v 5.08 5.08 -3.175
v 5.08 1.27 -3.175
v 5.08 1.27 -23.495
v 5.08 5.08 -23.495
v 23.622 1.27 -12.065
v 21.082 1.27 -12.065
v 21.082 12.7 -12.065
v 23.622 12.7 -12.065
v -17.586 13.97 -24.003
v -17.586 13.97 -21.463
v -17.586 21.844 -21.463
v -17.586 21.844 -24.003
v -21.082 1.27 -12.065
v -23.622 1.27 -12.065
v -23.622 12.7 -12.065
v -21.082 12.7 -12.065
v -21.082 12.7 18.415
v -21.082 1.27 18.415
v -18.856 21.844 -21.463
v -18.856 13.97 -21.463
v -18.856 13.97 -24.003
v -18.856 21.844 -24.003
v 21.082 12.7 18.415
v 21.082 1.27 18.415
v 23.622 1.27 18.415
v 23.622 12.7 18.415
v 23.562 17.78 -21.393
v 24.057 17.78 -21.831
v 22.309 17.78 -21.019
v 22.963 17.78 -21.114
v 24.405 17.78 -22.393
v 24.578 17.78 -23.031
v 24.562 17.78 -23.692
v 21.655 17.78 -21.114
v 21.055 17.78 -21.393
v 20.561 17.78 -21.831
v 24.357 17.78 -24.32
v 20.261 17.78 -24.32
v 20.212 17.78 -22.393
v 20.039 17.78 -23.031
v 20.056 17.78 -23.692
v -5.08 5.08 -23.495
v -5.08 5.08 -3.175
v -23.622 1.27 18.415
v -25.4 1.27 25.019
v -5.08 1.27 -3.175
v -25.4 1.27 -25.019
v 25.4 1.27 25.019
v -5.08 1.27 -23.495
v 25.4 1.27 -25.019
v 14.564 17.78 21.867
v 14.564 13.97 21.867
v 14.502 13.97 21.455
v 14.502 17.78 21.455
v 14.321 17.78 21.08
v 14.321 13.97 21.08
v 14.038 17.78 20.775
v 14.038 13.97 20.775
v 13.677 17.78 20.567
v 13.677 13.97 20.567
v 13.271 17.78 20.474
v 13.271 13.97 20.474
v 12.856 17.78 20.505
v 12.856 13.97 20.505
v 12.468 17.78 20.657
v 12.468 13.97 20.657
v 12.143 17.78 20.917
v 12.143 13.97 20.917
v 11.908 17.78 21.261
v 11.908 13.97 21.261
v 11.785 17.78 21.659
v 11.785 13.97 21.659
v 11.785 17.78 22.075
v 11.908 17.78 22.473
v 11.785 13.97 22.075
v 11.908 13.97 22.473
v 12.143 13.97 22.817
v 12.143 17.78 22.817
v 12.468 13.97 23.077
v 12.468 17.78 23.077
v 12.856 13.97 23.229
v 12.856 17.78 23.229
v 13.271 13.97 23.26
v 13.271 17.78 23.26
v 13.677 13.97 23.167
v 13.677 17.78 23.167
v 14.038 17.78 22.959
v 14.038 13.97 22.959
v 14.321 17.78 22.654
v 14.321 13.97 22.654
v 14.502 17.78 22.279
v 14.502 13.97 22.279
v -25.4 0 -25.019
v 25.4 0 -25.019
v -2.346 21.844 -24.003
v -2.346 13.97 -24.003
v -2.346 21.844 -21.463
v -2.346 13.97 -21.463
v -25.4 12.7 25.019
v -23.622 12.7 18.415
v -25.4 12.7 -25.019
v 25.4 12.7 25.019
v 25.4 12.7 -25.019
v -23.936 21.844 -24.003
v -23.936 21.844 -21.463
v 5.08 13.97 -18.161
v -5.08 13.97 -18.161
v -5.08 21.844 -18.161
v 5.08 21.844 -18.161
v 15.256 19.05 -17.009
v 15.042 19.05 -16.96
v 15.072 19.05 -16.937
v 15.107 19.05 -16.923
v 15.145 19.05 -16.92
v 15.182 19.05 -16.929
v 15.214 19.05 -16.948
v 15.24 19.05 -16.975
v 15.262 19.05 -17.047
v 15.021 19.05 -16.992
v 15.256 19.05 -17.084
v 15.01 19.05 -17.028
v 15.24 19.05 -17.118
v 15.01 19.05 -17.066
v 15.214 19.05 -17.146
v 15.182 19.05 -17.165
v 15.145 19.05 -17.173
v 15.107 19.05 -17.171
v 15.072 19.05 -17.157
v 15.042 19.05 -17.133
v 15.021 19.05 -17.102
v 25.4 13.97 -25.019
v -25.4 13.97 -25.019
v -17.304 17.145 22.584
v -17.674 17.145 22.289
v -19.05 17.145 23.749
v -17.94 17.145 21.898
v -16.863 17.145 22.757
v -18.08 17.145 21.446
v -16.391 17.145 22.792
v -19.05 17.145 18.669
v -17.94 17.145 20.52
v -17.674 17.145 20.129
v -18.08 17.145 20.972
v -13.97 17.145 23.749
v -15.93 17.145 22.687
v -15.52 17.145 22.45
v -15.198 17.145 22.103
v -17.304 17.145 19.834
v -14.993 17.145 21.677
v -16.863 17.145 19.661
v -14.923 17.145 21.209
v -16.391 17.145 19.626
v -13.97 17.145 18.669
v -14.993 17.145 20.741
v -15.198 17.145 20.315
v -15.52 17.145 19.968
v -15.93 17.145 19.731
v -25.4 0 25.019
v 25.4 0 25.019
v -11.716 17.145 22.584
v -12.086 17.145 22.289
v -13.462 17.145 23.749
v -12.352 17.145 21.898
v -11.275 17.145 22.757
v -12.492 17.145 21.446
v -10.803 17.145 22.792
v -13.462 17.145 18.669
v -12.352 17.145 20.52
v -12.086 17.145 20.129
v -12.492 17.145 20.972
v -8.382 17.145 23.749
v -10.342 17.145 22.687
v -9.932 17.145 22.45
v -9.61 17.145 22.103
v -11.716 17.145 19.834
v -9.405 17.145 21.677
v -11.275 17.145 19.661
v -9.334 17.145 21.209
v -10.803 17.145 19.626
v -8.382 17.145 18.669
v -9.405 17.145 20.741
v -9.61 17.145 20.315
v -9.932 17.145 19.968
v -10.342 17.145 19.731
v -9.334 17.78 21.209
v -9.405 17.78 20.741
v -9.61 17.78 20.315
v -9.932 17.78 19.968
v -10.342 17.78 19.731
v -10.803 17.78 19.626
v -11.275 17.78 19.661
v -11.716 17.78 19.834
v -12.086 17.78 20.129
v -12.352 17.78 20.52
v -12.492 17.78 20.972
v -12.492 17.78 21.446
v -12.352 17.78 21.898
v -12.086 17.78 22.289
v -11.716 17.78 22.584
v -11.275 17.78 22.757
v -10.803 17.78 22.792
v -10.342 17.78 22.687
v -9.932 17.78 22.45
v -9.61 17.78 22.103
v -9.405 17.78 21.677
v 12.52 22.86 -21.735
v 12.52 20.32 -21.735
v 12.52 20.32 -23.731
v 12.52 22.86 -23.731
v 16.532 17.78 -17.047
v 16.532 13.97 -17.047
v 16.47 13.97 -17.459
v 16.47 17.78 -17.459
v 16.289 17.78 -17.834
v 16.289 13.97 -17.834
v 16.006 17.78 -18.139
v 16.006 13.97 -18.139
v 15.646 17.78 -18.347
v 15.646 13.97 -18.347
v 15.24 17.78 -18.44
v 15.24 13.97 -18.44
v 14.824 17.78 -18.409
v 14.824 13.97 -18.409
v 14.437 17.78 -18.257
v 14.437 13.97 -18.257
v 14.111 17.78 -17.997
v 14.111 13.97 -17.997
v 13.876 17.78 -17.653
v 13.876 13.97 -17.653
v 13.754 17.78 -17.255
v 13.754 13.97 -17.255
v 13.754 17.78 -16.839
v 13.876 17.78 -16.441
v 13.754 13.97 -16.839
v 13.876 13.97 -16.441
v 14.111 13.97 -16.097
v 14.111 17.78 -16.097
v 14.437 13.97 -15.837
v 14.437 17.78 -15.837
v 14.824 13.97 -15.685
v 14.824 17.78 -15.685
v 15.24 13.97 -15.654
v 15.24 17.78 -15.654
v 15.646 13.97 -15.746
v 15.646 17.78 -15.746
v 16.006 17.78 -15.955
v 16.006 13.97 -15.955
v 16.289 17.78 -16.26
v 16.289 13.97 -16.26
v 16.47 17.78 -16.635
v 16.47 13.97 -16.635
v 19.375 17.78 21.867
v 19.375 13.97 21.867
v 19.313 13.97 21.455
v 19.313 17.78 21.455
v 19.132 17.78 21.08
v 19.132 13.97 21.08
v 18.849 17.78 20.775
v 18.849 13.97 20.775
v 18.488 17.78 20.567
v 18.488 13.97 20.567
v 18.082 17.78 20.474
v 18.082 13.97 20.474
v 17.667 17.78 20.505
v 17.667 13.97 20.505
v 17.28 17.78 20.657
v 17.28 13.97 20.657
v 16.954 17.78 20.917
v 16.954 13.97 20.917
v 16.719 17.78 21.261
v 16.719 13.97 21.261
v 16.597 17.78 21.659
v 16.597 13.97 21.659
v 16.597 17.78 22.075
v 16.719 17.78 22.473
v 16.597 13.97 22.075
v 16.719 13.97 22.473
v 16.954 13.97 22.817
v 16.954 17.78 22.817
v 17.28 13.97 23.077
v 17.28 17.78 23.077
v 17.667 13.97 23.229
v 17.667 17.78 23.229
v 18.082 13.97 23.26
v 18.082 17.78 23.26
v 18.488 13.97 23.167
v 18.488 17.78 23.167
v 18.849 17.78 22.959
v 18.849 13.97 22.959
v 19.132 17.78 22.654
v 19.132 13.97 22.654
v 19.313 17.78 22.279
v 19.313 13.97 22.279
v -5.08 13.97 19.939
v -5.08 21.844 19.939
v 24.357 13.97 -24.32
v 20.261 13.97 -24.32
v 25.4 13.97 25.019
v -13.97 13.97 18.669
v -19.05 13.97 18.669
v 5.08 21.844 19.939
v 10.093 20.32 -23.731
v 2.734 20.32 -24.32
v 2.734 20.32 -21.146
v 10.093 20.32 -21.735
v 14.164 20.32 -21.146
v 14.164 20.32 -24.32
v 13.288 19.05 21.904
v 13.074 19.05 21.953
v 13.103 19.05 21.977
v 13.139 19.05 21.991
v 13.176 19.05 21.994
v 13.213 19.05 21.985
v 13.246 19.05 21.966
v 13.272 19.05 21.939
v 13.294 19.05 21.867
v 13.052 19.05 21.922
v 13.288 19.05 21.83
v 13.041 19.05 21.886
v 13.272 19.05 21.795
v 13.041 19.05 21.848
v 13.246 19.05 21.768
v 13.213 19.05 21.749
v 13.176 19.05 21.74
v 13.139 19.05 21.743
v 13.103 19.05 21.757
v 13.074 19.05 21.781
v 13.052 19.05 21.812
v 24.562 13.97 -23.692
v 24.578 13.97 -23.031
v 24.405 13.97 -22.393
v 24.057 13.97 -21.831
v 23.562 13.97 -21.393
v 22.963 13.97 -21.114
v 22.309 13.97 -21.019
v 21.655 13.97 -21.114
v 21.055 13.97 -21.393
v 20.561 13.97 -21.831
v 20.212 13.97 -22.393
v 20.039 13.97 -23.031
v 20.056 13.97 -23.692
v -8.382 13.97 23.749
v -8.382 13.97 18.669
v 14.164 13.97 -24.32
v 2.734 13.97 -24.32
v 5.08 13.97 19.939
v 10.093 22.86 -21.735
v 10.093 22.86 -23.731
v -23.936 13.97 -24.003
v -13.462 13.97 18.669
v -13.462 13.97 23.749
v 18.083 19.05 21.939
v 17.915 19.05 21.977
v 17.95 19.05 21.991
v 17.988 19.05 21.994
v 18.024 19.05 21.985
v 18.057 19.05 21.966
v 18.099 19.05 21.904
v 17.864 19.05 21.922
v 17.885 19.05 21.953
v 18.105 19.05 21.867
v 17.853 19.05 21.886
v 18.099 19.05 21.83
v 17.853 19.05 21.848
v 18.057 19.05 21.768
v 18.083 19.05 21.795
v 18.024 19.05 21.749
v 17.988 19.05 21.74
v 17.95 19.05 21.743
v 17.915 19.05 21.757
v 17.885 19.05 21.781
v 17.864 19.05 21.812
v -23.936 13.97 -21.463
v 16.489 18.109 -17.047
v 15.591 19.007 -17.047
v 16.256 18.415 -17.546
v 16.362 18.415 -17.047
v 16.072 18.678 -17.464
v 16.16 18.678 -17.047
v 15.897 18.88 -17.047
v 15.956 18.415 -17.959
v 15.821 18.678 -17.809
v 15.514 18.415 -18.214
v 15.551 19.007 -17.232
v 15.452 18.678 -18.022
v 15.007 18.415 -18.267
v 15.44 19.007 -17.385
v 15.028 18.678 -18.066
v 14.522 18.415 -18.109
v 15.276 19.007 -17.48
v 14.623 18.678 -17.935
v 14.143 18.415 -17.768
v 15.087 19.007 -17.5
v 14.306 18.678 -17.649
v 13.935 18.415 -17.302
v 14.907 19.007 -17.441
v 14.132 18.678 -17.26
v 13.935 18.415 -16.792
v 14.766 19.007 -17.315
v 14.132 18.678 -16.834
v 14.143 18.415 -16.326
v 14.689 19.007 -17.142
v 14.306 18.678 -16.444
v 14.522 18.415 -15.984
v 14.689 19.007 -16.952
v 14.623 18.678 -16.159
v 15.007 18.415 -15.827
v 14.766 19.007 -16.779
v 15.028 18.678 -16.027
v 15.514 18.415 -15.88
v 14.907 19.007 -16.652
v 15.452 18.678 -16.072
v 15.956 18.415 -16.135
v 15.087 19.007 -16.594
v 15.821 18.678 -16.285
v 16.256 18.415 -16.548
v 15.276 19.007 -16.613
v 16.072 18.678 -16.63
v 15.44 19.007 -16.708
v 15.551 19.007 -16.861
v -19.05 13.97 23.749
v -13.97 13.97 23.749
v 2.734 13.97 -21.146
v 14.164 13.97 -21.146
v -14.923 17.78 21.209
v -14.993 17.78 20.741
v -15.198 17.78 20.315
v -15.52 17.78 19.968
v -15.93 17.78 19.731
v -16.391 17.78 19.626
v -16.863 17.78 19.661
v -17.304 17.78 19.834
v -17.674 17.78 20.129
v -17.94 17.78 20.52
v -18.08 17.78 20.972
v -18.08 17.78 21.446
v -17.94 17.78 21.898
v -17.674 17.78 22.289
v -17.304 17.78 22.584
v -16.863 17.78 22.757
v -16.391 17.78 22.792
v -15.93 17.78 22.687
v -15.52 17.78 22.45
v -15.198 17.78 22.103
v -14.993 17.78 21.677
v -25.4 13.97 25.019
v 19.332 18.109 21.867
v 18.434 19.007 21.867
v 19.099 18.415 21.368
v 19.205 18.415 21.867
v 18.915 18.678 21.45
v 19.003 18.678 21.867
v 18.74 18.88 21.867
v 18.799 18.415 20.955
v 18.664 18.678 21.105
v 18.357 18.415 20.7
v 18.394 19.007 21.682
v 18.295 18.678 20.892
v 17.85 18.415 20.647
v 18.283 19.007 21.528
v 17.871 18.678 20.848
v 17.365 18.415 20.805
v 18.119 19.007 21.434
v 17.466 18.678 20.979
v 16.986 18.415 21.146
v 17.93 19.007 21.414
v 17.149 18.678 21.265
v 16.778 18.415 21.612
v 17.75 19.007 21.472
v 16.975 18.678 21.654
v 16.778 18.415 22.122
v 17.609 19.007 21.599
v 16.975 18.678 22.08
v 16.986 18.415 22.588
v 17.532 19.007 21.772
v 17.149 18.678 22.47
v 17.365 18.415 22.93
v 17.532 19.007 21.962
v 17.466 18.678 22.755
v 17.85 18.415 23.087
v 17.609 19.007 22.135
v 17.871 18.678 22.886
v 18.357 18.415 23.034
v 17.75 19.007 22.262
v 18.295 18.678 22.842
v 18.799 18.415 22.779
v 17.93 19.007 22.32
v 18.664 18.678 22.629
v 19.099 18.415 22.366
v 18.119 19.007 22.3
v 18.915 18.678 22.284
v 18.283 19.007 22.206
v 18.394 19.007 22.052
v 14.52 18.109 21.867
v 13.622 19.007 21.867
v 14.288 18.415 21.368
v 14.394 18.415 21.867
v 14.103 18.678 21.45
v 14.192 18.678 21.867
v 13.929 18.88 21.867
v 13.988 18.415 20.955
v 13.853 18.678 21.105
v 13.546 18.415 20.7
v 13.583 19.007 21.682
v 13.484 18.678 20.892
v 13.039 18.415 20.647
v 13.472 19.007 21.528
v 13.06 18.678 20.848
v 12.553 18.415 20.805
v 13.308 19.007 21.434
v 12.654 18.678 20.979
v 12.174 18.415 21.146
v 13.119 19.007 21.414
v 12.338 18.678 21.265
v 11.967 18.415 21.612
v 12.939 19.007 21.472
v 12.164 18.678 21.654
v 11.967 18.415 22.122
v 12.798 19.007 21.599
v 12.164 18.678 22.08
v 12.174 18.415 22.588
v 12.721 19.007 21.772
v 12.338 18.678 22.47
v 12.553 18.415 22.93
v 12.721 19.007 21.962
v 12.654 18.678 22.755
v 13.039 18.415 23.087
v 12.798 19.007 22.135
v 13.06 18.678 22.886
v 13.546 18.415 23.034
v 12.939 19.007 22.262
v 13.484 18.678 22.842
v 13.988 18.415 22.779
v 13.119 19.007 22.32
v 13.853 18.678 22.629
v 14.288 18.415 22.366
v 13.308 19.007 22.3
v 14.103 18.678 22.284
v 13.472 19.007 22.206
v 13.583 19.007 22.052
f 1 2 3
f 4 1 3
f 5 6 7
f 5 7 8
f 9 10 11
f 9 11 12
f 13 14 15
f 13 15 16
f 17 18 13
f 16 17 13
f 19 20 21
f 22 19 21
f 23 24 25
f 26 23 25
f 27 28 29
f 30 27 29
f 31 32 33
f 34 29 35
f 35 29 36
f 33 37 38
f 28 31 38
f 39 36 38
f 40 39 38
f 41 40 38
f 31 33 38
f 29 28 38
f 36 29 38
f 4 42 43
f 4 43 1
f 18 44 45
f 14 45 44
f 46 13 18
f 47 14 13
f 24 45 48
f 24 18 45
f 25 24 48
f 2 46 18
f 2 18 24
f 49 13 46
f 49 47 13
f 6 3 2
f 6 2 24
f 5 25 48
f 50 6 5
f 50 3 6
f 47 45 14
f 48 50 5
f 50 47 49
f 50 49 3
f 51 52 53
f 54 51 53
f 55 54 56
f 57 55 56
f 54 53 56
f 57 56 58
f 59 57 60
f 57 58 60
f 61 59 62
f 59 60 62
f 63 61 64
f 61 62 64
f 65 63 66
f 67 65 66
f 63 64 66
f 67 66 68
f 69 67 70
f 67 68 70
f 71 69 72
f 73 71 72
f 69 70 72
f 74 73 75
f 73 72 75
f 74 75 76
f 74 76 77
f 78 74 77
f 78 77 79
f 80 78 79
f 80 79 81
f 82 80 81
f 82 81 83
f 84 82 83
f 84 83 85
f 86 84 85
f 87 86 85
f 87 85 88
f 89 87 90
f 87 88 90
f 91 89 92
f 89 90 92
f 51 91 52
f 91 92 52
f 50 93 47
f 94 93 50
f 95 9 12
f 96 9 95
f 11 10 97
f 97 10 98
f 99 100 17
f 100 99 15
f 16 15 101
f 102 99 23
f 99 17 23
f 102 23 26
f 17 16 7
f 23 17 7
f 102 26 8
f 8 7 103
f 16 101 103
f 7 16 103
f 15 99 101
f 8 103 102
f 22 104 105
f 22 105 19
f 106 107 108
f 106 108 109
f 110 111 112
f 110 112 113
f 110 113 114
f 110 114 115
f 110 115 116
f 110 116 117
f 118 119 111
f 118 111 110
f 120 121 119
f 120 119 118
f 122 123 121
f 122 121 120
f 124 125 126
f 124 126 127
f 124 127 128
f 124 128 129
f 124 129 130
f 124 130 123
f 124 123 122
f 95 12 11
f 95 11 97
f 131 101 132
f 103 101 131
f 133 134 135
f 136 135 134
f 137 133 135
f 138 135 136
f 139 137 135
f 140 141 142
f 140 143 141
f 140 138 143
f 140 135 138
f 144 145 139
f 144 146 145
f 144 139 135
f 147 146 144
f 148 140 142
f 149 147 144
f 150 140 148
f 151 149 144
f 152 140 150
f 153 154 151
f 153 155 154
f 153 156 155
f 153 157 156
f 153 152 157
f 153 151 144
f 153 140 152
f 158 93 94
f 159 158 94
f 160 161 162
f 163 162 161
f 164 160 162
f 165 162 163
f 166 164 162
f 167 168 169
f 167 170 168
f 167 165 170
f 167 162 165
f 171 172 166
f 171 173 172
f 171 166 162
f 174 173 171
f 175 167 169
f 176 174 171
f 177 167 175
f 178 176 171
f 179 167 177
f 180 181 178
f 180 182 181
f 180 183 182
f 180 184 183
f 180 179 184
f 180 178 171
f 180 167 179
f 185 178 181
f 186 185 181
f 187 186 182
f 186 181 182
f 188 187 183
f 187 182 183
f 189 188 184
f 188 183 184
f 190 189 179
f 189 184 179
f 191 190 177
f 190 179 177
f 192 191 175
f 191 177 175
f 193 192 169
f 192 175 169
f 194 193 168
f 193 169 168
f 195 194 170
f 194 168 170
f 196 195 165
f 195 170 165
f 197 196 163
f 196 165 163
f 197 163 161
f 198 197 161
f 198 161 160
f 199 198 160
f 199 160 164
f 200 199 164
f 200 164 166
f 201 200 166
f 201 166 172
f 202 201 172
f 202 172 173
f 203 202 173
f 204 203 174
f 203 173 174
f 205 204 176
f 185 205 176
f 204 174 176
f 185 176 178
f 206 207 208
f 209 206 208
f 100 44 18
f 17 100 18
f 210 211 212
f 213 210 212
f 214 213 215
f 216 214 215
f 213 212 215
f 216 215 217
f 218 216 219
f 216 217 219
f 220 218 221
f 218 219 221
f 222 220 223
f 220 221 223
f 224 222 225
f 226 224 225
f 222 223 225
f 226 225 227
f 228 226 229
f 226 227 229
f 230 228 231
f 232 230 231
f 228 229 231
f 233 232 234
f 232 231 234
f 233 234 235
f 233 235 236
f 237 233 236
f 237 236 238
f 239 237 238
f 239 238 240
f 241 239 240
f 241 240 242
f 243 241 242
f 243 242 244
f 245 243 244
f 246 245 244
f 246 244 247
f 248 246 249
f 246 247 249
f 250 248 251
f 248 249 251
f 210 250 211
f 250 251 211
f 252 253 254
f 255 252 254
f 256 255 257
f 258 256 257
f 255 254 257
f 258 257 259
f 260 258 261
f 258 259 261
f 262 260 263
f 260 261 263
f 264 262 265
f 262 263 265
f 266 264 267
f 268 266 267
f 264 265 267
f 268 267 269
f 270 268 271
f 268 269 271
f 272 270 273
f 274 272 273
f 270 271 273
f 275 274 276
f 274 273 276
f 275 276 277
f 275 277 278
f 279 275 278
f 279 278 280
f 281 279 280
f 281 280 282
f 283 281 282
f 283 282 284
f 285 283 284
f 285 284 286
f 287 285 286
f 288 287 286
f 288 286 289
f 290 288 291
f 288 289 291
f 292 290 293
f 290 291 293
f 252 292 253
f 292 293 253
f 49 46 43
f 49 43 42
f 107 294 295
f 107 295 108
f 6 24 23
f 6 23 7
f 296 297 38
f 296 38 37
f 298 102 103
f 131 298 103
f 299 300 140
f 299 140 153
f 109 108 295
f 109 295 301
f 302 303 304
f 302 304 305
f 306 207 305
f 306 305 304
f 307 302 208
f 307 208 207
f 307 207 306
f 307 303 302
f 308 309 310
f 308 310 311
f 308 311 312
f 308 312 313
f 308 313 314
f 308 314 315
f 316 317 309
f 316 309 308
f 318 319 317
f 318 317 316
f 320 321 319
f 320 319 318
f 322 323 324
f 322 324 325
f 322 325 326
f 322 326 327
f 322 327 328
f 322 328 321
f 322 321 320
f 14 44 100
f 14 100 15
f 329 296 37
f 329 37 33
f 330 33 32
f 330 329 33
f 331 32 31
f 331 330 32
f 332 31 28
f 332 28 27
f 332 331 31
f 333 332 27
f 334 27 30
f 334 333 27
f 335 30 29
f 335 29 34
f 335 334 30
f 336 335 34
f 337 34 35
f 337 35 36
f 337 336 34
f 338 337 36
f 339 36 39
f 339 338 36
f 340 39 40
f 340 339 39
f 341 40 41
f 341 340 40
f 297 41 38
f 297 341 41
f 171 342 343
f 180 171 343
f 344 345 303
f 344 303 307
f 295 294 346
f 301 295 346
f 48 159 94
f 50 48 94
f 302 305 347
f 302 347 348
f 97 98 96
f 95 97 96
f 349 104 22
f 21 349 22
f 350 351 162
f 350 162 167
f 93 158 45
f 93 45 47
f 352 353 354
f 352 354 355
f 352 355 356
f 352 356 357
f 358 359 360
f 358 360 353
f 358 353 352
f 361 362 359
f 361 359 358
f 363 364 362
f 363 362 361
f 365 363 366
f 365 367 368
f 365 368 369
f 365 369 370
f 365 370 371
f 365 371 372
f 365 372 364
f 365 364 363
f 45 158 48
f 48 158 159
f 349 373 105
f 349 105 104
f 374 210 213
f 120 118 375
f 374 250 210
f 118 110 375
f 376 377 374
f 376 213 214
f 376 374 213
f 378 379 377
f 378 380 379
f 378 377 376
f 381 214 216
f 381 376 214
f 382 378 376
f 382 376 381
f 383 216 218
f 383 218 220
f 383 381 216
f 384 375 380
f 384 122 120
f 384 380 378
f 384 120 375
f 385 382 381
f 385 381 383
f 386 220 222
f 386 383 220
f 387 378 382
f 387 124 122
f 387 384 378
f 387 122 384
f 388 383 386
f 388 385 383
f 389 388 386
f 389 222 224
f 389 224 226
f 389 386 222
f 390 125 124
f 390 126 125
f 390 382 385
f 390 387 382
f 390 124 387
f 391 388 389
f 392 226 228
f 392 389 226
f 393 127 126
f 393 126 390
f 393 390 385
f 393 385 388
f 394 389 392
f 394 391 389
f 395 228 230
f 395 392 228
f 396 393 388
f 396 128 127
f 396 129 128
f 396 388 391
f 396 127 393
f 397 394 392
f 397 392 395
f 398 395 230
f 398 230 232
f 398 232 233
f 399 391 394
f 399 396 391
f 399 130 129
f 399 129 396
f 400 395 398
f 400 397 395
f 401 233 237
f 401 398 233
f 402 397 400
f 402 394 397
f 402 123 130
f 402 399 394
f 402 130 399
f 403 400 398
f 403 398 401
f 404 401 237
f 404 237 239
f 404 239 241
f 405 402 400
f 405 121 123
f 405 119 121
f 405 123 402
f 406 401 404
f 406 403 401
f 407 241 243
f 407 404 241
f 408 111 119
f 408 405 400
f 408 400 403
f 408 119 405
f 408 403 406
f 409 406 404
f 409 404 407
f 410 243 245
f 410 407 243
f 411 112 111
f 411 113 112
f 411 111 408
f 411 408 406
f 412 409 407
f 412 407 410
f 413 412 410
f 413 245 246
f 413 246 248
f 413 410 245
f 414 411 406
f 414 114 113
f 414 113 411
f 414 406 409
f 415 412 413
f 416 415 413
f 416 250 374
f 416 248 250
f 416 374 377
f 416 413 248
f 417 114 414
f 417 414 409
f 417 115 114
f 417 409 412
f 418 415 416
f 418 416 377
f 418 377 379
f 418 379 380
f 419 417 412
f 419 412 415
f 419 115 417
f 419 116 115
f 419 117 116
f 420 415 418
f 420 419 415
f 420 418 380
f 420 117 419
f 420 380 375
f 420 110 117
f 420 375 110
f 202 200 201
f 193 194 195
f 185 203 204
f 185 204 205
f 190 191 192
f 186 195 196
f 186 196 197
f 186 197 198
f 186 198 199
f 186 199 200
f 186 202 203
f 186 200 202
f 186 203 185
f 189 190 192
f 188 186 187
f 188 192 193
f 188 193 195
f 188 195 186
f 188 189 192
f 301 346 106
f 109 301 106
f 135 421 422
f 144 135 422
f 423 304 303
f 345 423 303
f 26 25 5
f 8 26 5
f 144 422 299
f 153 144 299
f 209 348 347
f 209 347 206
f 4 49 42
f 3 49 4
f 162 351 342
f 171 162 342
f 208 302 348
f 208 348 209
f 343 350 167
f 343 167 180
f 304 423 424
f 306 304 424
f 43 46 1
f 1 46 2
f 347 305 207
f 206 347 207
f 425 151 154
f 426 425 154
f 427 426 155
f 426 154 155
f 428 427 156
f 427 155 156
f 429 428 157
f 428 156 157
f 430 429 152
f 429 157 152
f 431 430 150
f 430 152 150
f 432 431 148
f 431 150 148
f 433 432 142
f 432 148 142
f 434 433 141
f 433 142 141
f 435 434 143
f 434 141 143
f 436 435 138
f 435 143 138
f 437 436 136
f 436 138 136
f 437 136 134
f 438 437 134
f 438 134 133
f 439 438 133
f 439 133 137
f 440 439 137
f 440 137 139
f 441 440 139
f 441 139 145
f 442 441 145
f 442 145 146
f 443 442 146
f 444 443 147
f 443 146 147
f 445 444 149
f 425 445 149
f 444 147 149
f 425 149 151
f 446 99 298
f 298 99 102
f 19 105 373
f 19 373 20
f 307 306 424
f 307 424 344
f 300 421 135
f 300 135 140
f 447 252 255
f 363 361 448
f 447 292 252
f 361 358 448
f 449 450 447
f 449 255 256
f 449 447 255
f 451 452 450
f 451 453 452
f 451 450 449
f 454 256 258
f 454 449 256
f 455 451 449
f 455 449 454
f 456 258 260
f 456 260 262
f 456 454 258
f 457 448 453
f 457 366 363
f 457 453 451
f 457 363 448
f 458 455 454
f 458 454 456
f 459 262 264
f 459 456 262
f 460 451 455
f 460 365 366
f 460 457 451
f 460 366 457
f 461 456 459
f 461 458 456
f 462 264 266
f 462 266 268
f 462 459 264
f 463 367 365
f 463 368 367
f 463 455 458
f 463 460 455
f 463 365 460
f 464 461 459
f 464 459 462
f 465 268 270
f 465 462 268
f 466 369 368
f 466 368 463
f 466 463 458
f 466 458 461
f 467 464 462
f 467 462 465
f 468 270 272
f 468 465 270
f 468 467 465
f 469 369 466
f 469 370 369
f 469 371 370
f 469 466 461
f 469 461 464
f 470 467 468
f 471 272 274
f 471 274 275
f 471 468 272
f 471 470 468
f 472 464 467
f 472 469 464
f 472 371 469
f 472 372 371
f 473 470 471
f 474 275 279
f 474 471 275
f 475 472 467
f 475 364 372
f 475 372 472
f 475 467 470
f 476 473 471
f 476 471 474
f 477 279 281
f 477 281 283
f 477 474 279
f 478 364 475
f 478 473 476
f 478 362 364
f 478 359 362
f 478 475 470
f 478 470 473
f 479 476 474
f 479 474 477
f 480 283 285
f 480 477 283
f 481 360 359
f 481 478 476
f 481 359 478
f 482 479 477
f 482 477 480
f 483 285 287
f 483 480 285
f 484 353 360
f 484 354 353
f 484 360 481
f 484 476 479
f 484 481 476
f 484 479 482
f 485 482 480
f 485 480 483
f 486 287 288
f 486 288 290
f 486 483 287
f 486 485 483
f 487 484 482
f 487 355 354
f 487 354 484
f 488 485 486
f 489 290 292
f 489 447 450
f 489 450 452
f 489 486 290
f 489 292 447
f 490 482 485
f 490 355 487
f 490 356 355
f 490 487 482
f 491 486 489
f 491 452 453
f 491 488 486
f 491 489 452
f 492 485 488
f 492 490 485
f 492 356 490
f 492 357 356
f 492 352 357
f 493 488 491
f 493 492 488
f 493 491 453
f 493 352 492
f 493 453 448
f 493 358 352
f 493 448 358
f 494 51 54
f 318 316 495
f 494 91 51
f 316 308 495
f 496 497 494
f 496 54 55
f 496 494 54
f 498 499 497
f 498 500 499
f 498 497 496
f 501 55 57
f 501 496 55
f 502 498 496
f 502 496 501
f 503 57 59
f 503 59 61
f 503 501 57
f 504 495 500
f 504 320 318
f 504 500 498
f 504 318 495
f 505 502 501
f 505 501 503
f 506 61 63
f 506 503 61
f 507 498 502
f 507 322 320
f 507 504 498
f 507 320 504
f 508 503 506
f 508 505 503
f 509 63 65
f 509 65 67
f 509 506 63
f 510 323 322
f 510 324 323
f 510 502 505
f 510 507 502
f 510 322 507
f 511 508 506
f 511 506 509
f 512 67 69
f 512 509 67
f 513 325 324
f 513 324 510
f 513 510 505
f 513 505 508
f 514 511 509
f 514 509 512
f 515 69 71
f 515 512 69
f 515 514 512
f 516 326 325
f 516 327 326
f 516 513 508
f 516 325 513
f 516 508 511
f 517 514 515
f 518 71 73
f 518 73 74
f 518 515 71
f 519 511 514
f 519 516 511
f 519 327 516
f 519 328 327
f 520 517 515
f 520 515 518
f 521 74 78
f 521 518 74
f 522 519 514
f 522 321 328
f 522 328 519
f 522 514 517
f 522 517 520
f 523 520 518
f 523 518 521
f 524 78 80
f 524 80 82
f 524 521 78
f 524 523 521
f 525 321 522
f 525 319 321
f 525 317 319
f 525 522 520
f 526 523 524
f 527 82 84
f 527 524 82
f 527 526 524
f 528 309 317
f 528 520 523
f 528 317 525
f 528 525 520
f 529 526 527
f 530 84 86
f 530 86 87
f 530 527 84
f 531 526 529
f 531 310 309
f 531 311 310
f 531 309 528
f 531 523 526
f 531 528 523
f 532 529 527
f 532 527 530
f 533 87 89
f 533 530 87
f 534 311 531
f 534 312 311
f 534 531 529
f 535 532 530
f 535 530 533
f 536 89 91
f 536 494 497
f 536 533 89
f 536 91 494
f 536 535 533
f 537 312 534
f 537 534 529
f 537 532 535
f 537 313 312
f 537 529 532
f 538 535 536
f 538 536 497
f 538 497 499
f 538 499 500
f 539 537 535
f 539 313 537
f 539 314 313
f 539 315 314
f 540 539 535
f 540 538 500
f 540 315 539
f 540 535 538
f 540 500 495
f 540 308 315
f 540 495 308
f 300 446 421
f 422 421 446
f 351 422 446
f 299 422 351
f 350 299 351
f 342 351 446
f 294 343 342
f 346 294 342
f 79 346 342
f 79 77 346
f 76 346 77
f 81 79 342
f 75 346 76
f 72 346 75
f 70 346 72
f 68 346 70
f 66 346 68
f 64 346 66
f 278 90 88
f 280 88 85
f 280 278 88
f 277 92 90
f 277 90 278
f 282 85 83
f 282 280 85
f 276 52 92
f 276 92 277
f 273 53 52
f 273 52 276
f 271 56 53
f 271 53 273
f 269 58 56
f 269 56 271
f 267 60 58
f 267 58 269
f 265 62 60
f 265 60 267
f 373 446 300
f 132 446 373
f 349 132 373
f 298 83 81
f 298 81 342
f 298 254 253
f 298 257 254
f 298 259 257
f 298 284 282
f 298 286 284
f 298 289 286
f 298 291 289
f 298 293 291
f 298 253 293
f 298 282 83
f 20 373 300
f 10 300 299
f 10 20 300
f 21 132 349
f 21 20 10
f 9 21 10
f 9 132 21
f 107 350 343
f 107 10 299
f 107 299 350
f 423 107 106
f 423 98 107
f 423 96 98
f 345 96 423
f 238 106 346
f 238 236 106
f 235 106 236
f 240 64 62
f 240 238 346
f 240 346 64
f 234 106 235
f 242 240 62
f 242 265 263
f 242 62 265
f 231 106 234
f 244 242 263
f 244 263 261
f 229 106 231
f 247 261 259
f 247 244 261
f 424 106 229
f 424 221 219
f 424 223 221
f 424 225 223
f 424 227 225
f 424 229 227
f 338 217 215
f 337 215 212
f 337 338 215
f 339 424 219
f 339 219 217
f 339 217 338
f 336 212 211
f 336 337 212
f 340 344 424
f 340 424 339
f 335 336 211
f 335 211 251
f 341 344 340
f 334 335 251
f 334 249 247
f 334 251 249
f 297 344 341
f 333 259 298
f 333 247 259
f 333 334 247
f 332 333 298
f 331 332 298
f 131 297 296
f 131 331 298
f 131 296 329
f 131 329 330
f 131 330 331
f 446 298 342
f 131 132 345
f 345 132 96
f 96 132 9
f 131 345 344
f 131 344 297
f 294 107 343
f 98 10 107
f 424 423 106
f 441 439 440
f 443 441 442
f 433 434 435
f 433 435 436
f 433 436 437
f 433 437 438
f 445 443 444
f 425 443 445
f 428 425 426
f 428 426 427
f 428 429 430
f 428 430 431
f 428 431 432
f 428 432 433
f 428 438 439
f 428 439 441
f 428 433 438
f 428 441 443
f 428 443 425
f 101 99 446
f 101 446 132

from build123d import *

# Parameters (mm, degrees)
SKETCH1_W            = 50.8
SKETCH1_H            = 50.038
BOSS_EXTRUDE1_DEPTH  = 1.27
SKETCH2_W            = 2.54
SKETCH2_H            = 30.48
BOSS_EXTRUDE2_DEPTH  = 11.43
SKETCH3_W            = 10.16
SKETCH3_H            = 20.32
BOSS_EXTRUDE3_DEPTH  = 3.81
SKETCH4_W            = 50.8
SKETCH4_H            = 50.038
BOSS_EXTRUDE4_DEPTH  = 1.27
SKETCH5_W            = 10.16
SKETCH5_H            = 38.1
SKETCH5_W_2          = 5.08
SKETCH5_H_2          = 2.54
SKETCH5_W_3          = 15.24
BOSS_EXTRUDE5_DEPTH  = 7.874
SKETCH5_3_W          = 5.08
SKETCH5_3_H          = 5.08
BOSS_EXTRUDE6_DEPTH  = 3.175
SKETCH5_4_R          = 1.397
BOSS_EXTRUDE7_DEPTH  = 5.08
SKETCH5_5_W          = 11.43
SKETCH5_5_H          = 3.175
BOSS_EXTRUDE8_DEPTH  = 6.35
BOSS_EXTRUDE9_DEPTH  = 3.81
FILLET1_R            = 1.27
SKETCH8_R            = 1.5875
BOSS_EXTRUDE10_DEPTH = 0.635
SKETCH9_W            = 2.427127008
SKETCH9_H            = 1.995592696
BOSS_EXTRUDE11_DEPTH = 2.54


with BuildPart() as part:
    # Sketch1 → Boss-Extrude1 (new body)
    with BuildSketch(Plane(origin=(0, 0, 0), x_dir=(1, 0, 0), z_dir=(0, 1, 0))):
        Rectangle(SKETCH1_W, SKETCH1_H)
    extrude(amount=BOSS_EXTRUDE1_DEPTH)

    # Sketch2 → Boss-Extrude2 (add)
    with BuildSketch(Plane(origin=(0, 1.27, 0), x_dir=(1, 0, 0), z_dir=(0, 1, 0))):
        with Locations((-22.352, -3.175)):
            Rectangle(SKETCH2_W, SKETCH2_H)
        with Locations((22.352, -3.175)):
            Rectangle(SKETCH2_W, SKETCH2_H)
    extrude(amount=BOSS_EXTRUDE2_DEPTH)

    # Sketch3 → Boss-Extrude3 (add)
    with BuildSketch(Plane(origin=(0, 1.27, 0), x_dir=(1, 0, 0), z_dir=(0, 1, 0))):
        with Locations((0, 13.335)):
            Rectangle(SKETCH3_W, SKETCH3_H)
    extrude(amount=BOSS_EXTRUDE3_DEPTH)

    # Sketch4 → Boss-Extrude4 (add)
    with BuildSketch(Plane(origin=(0, 12.7, 0), x_dir=(1, 0, 0), z_dir=(0, 1, 0))):
        Rectangle(SKETCH4_W, SKETCH4_H)
    extrude(amount=BOSS_EXTRUDE4_DEPTH)

    # Sketch5 → Boss-Extrude5 (add)
    with BuildSketch(Plane(origin=(0, 13.97, 0), x_dir=(1, 0, 0), z_dir=(0, 1, 0))):
        with Locations((0, -0.889)):
            Rectangle(SKETCH5_W, SKETCH5_H)
        with Locations((-21.396399328, 22.733)):
            Rectangle(SKETCH5_W_2, SKETCH5_H_2)
        with Locations((-9.966399328, 22.733)):
            Rectangle(SKETCH5_W_3, SKETCH5_H_2)
    extrude(amount=BOSS_EXTRUDE5_DEPTH)

    # Sketch5<3> → Boss-Extrude6 (add)
    with BuildSketch(Plane(origin=(0, 13.97, 0), x_dir=(1, 0, 0), z_dir=(0, 1, 0))):
        with Locations((-10.922, -21.209)):
            Rectangle(SKETCH5_3_W, SKETCH5_3_H)
        with Locations((-16.51, -21.209)):
            Rectangle(SKETCH5_3_W, SKETCH5_3_H)
    extrude(amount=BOSS_EXTRUDE6_DEPTH)

    # Sketch5<4> → Boss-Extrude7 (add)
    with BuildSketch(Plane(origin=(0, 13.97, 0), x_dir=(1, 0, 0), z_dir=(0, 1, 0))):
        with Locations((13.16676441, -21.867024383)):
            Circle(SKETCH5_4_R)
        with Locations((17.978093258, -21.867024383)):
            Circle(SKETCH5_4_R)
        with Locations((15.135118943, 17.046813881)):
            Circle(SKETCH5_4_R)
    extrude(amount=BOSS_EXTRUDE7_DEPTH)

    # Sketch5<5> → Boss-Extrude8 (add)
    with BuildSketch(Plane(origin=(0, 13.97, 0), x_dir=(1, 0, 0), z_dir=(0, 1, 0))):
        with Locations((8.448600672, 22.733)):
            Rectangle(SKETCH5_5_W, SKETCH5_5_H)
    extrude(amount=BOSS_EXTRUDE8_DEPTH)

    # Sketch5<6> → Boss-Extrude9 (add)
    with BuildSketch(Plane(origin=(0, 13.97, 0), x_dir=(1, 0, 0), z_dir=(0, 1, 0))):
        with BuildLine():
            Line((20.260877265, 24.3205), (24.356504201, 24.3205))
            ThreePointArc((24.356504201, 24.3205), (22.308690733, 21.0185), (20.260877265, 24.3205))
        make_face()
    extrude(amount=BOSS_EXTRUDE9_DEPTH)

    # Fillet1
    fillet1_edges = [part.edges().sort_by_distance(p)[0] for p in [
        (16.581093258, 19.05, 21.867024383),
        (11.76976441, 19.05, 21.867024383),
        (13.738118943, 19.05, -17.046813881),
    ]]
    fillet(fillet1_edges, radius=FILLET1_R)

    # Sketch8 → Boss-Extrude10 (add)
    with BuildSketch(Plane(origin=(0, 17.145, 0), x_dir=(1, 0, 0), z_dir=(0, 1, 0))):
        with Locations((-16.51, -21.209)):
            Circle(SKETCH8_R)
        with Locations((-10.922, -21.209)):
            Circle(SKETCH8_R)
    extrude(amount=BOSS_EXTRUDE10_DEPTH)

    # Sketch9 → Boss-Extrude11 (add)
    with BuildSketch(Plane(origin=(0, 20.32, 0), x_dir=(1, 0, 0), z_dir=(0, 1, 0))):
        with Locations((11.306100672, 22.733)):
            Rectangle(SKETCH9_W, SKETCH9_H)
    extrude(amount=BOSS_EXTRUDE11_DEPTH)


solid = part.part
